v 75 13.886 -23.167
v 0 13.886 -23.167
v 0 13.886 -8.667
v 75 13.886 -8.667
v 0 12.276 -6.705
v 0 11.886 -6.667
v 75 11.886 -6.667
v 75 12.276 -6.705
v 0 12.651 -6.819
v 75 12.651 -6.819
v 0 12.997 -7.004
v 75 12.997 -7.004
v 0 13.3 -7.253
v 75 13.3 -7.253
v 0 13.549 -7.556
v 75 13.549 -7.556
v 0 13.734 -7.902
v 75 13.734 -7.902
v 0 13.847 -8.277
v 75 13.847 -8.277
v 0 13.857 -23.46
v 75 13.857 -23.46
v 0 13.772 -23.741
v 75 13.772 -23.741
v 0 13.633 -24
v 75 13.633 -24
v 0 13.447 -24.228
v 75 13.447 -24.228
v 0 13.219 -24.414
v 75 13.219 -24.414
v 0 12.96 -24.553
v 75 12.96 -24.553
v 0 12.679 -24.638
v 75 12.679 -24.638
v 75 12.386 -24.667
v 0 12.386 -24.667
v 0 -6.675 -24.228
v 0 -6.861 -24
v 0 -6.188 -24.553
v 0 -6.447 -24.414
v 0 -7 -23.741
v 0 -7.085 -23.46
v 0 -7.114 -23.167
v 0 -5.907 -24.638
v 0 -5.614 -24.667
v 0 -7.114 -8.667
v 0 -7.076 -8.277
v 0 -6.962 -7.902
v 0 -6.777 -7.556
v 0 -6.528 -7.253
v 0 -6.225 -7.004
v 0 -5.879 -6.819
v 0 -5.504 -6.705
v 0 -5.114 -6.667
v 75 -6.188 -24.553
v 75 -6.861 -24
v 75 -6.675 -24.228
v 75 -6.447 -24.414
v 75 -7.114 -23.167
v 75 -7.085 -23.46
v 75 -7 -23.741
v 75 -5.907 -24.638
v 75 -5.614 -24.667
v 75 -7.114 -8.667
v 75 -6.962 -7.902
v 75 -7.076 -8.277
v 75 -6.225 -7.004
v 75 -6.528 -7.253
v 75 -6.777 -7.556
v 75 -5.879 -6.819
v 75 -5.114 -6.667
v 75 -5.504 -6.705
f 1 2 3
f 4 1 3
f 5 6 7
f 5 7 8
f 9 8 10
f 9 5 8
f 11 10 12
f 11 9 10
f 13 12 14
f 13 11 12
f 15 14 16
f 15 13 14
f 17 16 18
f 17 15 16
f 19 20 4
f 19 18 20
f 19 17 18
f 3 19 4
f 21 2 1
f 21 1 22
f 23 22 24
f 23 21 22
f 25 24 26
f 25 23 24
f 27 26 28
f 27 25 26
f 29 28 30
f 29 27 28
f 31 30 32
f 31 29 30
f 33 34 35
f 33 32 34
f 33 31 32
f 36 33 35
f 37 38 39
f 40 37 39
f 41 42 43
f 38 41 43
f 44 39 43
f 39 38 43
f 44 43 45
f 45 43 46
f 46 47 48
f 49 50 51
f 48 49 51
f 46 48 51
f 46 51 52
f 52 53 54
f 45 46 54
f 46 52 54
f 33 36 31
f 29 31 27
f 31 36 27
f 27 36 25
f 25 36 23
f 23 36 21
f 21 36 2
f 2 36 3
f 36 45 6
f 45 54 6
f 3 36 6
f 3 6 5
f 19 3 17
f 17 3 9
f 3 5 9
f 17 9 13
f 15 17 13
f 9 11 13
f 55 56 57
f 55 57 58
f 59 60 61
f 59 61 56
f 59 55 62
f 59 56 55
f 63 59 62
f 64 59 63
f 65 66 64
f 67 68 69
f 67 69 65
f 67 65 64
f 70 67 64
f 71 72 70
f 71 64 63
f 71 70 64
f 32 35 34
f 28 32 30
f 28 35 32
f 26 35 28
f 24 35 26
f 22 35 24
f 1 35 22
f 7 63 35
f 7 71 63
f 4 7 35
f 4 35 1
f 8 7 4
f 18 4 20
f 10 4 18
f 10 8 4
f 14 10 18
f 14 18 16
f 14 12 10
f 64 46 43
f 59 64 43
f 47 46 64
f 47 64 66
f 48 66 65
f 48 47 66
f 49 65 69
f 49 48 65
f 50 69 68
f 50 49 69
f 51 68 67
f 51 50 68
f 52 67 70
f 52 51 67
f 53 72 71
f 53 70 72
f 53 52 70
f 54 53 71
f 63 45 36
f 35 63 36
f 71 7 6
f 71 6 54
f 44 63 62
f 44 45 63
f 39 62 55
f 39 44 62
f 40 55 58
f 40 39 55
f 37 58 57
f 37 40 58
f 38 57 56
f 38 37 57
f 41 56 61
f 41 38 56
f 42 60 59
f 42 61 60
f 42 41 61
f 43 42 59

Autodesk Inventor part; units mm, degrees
ref_plane "YZ Plane" through (0, 0, 0) normal (1, 0, 0) x (0, 1, 0)
ref_plane "XZ Plane" through (0, 0, 0) normal (0, 1, 0) x (-1, 0, 0)
ref_plane "XY Plane" through (0, 0, 0) normal (0, 0, 1) x (1, 0, 0)
sketch "Sketch1" plane through (0, 0, 0) normal (1, 0, 0) x (0, 1, 0)
  line L0 (11.8859, -6.6669) -> (-5.1141, -6.6669)
  line L1 (-7.1141, -8.6669) -> (-7.1141, -23.1669)
  line L2 (-5.6141, -24.6669) -> (12.3859, -24.6669)
  line L3 (13.8859, -23.1669) -> (13.8859, -8.6669)
  arc A0 (13.8859, -8.6669) -> (11.8859, -6.6669) centre (11.8859, -8.6669) ccw
  arc A1 (-5.1141, -6.6669) -> (-7.1141, -8.6669) centre (-5.1141, -8.6669) ccw
  arc A2 (12.3859, -24.6669) -> (13.8859, -23.1669) centre (12.3859, -23.1669) ccw
  arc A3 (-7.1141, -23.1669) -> (-5.6141, -24.6669) centre (-5.6141, -23.1669) ccw
  point P0 (0, 0)
  point P1 (-7.1141, -24.6669)
  point P2 (-7.1141, -6.6669)
  point P3 (13.8859, -24.6669)
  dimension "d0" = 21
  dimension "d1" = 18
  dimension "d2" = 2
  dimension "d3" = 1.5
extrude "Extrusion1" add sketch "Sketch1" along normal blind 75
properties part number "Batt"
